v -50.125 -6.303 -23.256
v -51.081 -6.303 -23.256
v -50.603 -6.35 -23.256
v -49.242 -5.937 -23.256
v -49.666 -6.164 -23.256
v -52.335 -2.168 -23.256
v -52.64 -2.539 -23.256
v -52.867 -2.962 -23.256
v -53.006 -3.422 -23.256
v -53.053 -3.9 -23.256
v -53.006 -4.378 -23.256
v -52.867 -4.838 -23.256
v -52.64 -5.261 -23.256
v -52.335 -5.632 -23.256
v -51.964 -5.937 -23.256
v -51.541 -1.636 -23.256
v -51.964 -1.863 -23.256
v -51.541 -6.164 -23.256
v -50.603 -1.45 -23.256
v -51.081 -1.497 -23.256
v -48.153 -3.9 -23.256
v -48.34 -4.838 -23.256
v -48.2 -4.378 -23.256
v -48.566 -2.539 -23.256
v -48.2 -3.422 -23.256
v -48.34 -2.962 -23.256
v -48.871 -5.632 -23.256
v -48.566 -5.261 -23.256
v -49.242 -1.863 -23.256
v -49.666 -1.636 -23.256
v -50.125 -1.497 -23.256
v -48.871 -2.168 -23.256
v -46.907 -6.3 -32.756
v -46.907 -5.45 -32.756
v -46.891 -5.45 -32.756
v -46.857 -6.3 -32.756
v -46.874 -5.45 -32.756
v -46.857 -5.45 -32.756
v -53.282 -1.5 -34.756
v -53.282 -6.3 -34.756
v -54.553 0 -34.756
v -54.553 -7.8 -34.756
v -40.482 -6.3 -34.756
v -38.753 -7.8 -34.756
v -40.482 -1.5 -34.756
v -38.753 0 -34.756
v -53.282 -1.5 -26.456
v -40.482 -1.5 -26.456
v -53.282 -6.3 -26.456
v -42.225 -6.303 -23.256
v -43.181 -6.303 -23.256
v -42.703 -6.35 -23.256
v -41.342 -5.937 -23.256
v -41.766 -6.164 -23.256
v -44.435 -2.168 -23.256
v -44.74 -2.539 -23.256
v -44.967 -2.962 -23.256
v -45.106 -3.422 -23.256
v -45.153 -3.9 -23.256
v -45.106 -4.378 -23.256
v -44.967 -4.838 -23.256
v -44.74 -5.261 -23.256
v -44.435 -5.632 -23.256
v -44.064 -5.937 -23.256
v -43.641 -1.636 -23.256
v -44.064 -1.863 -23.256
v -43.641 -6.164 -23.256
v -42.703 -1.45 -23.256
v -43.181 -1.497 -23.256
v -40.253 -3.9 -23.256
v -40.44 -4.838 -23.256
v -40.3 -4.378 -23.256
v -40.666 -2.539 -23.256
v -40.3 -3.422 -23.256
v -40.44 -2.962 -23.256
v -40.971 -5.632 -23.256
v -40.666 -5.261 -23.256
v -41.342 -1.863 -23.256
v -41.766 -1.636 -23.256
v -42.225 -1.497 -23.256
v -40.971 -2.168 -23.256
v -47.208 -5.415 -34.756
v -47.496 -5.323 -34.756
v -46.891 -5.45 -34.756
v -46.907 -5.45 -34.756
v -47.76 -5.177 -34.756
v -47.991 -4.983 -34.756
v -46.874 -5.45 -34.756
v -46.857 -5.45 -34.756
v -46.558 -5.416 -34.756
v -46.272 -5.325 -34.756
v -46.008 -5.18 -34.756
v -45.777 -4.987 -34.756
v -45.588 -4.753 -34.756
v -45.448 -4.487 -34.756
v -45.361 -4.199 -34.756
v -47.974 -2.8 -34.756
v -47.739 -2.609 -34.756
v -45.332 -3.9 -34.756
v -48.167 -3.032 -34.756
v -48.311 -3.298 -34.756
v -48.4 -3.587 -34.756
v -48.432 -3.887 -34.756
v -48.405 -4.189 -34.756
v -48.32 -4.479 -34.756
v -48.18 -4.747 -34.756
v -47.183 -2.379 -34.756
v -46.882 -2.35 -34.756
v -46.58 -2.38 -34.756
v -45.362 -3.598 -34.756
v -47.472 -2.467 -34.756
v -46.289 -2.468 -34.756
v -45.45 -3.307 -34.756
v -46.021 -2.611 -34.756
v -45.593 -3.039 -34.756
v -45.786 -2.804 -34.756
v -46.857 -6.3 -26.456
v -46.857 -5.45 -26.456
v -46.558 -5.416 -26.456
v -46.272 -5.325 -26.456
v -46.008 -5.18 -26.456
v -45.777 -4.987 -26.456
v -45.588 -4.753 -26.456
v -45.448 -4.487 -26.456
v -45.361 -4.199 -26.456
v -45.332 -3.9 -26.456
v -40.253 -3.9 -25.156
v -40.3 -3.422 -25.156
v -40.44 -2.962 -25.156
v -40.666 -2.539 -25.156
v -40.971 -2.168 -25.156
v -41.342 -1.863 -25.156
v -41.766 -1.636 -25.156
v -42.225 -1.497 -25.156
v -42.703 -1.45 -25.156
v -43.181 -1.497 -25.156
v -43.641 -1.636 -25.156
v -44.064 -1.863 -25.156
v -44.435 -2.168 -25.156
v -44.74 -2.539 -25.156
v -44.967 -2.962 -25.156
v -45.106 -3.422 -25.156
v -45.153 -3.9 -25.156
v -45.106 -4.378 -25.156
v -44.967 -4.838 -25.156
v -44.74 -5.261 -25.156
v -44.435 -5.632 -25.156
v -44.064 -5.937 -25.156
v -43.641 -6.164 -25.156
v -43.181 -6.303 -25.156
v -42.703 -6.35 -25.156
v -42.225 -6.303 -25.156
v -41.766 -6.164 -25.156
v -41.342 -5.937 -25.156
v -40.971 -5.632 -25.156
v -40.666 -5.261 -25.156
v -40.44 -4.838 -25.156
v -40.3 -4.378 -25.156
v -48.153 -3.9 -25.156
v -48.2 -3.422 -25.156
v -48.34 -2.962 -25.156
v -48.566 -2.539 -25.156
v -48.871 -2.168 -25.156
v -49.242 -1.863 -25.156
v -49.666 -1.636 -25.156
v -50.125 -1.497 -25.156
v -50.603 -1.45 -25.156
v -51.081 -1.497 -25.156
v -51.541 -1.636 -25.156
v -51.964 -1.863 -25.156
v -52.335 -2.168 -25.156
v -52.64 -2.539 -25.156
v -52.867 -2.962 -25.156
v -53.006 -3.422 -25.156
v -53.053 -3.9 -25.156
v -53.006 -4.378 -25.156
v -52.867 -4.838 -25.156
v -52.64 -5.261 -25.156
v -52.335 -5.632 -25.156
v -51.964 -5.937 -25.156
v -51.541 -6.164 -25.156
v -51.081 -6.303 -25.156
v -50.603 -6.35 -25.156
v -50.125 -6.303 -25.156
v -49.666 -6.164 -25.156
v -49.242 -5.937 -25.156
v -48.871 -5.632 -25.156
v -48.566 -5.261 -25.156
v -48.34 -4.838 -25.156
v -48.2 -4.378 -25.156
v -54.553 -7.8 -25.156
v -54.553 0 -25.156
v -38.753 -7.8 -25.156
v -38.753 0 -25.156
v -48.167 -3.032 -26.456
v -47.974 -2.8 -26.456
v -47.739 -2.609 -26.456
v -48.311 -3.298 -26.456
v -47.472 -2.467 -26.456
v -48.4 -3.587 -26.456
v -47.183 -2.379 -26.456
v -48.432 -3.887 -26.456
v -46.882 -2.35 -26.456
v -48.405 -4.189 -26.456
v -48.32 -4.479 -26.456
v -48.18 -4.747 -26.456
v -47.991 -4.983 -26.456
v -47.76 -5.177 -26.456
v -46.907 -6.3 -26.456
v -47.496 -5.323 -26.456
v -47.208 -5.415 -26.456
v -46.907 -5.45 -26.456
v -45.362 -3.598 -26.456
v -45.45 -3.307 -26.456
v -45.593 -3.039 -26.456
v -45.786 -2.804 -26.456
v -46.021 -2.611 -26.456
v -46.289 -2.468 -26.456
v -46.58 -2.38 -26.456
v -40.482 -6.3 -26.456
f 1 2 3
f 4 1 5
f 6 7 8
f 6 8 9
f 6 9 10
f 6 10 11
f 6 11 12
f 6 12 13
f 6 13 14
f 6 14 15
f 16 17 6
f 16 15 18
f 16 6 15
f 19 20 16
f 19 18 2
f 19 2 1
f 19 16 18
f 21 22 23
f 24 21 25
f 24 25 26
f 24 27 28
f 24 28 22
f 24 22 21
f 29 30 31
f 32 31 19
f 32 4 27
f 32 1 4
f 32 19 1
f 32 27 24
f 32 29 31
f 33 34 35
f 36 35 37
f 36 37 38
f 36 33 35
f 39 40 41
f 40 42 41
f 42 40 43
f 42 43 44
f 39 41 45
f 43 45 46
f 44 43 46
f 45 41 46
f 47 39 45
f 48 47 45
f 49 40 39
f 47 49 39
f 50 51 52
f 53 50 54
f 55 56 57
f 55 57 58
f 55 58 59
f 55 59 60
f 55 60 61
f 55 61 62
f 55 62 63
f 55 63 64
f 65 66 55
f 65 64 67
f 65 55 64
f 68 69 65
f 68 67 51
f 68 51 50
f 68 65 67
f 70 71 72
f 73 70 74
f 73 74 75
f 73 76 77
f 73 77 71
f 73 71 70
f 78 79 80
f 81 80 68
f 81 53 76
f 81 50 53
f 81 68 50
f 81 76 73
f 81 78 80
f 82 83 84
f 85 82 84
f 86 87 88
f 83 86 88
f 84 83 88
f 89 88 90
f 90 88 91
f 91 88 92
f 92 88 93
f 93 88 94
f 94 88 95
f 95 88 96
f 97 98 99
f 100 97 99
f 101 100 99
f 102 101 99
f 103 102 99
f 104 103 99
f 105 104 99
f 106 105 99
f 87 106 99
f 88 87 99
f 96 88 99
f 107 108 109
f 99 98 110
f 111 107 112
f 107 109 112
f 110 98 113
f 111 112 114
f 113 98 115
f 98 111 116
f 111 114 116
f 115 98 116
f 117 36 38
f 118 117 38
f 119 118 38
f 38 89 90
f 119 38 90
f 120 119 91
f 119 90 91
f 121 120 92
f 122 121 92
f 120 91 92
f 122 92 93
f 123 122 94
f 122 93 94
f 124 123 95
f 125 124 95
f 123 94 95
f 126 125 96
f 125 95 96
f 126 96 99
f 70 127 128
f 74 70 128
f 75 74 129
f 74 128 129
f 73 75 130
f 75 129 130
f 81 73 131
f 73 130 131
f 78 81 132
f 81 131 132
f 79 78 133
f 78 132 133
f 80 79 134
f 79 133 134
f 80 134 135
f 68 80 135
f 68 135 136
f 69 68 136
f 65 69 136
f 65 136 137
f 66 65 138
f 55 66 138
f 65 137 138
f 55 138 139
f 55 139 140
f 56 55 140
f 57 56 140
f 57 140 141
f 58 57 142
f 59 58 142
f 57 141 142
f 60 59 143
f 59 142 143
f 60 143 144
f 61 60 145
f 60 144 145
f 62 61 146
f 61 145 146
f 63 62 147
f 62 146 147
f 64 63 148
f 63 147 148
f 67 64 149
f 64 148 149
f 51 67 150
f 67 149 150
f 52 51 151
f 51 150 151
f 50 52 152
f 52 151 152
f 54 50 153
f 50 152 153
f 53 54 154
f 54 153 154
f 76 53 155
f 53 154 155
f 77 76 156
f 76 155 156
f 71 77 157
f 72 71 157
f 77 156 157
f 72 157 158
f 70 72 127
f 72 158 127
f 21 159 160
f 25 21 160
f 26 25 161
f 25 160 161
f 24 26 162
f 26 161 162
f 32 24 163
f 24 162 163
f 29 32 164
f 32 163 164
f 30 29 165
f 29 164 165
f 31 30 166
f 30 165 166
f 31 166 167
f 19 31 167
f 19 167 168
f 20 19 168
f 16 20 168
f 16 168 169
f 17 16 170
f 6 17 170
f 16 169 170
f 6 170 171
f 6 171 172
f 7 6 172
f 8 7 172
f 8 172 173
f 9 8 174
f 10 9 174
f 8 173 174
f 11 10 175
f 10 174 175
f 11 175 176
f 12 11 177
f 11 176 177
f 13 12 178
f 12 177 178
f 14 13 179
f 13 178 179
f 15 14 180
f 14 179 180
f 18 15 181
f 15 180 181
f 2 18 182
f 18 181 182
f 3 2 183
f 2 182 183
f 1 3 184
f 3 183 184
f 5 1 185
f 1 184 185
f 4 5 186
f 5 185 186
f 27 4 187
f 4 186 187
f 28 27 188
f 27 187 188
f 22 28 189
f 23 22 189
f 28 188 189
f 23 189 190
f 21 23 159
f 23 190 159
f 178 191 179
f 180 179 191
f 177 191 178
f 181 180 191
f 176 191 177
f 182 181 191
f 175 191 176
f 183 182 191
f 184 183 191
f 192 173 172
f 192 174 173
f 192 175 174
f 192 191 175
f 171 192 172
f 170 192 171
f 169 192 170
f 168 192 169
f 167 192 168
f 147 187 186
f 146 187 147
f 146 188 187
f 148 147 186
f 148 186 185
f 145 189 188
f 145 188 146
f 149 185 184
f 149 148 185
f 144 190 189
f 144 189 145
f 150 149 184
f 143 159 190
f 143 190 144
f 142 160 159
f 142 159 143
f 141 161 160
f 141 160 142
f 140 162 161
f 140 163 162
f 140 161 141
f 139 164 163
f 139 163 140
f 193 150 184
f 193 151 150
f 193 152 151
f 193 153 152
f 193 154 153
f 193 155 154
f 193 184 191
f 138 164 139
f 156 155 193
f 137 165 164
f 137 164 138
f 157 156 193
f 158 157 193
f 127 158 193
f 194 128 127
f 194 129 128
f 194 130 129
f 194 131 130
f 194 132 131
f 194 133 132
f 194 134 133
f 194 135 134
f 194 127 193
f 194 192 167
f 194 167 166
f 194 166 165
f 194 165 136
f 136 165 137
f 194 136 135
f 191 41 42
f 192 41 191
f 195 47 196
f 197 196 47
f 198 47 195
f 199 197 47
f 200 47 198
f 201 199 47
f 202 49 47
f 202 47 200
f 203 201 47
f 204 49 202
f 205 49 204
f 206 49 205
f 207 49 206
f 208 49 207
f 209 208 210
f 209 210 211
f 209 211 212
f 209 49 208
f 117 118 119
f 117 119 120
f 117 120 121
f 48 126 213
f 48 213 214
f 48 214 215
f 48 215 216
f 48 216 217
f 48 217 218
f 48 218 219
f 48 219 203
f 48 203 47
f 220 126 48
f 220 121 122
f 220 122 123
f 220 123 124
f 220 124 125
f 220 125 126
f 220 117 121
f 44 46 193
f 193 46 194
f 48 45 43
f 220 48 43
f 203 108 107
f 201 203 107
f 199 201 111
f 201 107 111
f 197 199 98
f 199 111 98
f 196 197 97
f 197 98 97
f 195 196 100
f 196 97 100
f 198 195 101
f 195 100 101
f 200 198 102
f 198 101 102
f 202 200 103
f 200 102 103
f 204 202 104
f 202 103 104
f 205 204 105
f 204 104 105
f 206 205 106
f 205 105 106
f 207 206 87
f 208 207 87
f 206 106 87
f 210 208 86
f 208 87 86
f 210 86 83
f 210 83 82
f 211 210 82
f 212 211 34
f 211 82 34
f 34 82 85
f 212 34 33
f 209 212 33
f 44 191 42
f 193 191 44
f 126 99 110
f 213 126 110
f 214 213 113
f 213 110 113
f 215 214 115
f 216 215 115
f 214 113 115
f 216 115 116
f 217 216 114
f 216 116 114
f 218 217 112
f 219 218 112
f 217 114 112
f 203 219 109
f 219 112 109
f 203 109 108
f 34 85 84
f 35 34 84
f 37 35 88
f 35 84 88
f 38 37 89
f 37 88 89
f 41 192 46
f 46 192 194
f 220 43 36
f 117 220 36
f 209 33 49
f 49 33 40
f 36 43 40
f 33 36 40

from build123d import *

# Parameters (mm, degrees)
F0_W     = 15.8
F0_H     = 9.6
F1_DEPTH = 7.8
F2_R     = 2.45
F3_DEPTH = 1.9
F5_DEPTH = 8.3
F6_DEPTH = 2


with BuildPart() as f1:
    # F0 (on Front) → F1 (new body)
    with BuildSketch(Plane.XZ):
        with Locations((-46.6530766249, -29.9555875778)):
            Rectangle(F0_W, F0_H)
    extrude(amount=F1_DEPTH)

    # F2 (on face) → F3 (join)
    with BuildSketch(Plane.XY.offset(-25.1555875778)):
        with Locations((-50.6030766249, -3.9)):
            Circle(F2_R)
        with Locations((-42.7030766249, -3.9)):
            Circle(F2_R)
    extrude(amount=F3_DEPTH)

    # F4 (on face) → F5 (cut)
    with BuildSketch(Plane(origin=(0, 0, -34.7555875778), x_dir=(1, 0, 0), z_dir=(0, 0, -1))):
        with BuildLine():
            Line((-53.2821939588, 6.3), (-53.2821939588, 1.5))
            Line((-53.2821939588, 1.5), (-46.8821939588, 1.5))
            Line((-46.8821939588, 1.5), (-46.8821939588, 1.925))
            Line((-46.8821939588, 1.925), (-46.8821939588, 2.35))
            ThreePointArc((-46.8821939588, 2.35), (-48.4321435514, 3.8874995935), (-46.9071939588, 5.449798374))
            Line((-46.9071939588, 5.449798374), (-46.9071939588, 6.3))
            Line((-46.9071939588, 6.3), (-53.2821939588, 6.3))
        make_face()
        with BuildLine():
            Line((-46.8821939588, 1.925), (-46.8821939588, 1.5))
            Line((-46.8821939588, 1.5), (-40.4821939588, 1.5))
            Line((-40.4821939588, 1.5), (-40.4821939588, 6.3))
            Line((-40.4821939588, 6.3), (-46.8571939588, 6.3))
            Line((-46.8571939588, 6.3), (-46.8571939588, 5.449798374))
            ThreePointArc((-46.8571939588, 5.449798374), (-45.7773749691, 4.9871407453), (-45.3321939588, 3.9))
            ThreePointArc((-45.3321939588, 3.9), (-45.7861784479, 2.8039844892), (-46.8821939588, 2.35))
            Line((-46.8821939588, 2.35), (-46.8821939588, 1.925))
        make_face()
    extrude(amount=-F5_DEPTH, mode=Mode.SUBTRACT)

    # F4 (on face) → F6 (cut)
    with BuildSketch(Plane(origin=(0, 0, -34.7555875778), x_dir=(1, 0, 0), z_dir=(0, 0, -1))):
        with BuildLine():
            Line((-46.8571939588, 6.3), (-46.9071939588, 6.3))
            Line((-46.9071939588, 6.3), (-46.9071939588, 5.449798374))
            ThreePointArc((-46.9071939588, 5.449798374), (-46.8821939588, 5.45), (-46.8571939588, 5.449798374))
            Line((-46.8571939588, 5.449798374), (-46.8571939588, 6.3))
        make_face()
    extrude(amount=-F6_DEPTH, mode=Mode.SUBTRACT)


solid = f1.part
